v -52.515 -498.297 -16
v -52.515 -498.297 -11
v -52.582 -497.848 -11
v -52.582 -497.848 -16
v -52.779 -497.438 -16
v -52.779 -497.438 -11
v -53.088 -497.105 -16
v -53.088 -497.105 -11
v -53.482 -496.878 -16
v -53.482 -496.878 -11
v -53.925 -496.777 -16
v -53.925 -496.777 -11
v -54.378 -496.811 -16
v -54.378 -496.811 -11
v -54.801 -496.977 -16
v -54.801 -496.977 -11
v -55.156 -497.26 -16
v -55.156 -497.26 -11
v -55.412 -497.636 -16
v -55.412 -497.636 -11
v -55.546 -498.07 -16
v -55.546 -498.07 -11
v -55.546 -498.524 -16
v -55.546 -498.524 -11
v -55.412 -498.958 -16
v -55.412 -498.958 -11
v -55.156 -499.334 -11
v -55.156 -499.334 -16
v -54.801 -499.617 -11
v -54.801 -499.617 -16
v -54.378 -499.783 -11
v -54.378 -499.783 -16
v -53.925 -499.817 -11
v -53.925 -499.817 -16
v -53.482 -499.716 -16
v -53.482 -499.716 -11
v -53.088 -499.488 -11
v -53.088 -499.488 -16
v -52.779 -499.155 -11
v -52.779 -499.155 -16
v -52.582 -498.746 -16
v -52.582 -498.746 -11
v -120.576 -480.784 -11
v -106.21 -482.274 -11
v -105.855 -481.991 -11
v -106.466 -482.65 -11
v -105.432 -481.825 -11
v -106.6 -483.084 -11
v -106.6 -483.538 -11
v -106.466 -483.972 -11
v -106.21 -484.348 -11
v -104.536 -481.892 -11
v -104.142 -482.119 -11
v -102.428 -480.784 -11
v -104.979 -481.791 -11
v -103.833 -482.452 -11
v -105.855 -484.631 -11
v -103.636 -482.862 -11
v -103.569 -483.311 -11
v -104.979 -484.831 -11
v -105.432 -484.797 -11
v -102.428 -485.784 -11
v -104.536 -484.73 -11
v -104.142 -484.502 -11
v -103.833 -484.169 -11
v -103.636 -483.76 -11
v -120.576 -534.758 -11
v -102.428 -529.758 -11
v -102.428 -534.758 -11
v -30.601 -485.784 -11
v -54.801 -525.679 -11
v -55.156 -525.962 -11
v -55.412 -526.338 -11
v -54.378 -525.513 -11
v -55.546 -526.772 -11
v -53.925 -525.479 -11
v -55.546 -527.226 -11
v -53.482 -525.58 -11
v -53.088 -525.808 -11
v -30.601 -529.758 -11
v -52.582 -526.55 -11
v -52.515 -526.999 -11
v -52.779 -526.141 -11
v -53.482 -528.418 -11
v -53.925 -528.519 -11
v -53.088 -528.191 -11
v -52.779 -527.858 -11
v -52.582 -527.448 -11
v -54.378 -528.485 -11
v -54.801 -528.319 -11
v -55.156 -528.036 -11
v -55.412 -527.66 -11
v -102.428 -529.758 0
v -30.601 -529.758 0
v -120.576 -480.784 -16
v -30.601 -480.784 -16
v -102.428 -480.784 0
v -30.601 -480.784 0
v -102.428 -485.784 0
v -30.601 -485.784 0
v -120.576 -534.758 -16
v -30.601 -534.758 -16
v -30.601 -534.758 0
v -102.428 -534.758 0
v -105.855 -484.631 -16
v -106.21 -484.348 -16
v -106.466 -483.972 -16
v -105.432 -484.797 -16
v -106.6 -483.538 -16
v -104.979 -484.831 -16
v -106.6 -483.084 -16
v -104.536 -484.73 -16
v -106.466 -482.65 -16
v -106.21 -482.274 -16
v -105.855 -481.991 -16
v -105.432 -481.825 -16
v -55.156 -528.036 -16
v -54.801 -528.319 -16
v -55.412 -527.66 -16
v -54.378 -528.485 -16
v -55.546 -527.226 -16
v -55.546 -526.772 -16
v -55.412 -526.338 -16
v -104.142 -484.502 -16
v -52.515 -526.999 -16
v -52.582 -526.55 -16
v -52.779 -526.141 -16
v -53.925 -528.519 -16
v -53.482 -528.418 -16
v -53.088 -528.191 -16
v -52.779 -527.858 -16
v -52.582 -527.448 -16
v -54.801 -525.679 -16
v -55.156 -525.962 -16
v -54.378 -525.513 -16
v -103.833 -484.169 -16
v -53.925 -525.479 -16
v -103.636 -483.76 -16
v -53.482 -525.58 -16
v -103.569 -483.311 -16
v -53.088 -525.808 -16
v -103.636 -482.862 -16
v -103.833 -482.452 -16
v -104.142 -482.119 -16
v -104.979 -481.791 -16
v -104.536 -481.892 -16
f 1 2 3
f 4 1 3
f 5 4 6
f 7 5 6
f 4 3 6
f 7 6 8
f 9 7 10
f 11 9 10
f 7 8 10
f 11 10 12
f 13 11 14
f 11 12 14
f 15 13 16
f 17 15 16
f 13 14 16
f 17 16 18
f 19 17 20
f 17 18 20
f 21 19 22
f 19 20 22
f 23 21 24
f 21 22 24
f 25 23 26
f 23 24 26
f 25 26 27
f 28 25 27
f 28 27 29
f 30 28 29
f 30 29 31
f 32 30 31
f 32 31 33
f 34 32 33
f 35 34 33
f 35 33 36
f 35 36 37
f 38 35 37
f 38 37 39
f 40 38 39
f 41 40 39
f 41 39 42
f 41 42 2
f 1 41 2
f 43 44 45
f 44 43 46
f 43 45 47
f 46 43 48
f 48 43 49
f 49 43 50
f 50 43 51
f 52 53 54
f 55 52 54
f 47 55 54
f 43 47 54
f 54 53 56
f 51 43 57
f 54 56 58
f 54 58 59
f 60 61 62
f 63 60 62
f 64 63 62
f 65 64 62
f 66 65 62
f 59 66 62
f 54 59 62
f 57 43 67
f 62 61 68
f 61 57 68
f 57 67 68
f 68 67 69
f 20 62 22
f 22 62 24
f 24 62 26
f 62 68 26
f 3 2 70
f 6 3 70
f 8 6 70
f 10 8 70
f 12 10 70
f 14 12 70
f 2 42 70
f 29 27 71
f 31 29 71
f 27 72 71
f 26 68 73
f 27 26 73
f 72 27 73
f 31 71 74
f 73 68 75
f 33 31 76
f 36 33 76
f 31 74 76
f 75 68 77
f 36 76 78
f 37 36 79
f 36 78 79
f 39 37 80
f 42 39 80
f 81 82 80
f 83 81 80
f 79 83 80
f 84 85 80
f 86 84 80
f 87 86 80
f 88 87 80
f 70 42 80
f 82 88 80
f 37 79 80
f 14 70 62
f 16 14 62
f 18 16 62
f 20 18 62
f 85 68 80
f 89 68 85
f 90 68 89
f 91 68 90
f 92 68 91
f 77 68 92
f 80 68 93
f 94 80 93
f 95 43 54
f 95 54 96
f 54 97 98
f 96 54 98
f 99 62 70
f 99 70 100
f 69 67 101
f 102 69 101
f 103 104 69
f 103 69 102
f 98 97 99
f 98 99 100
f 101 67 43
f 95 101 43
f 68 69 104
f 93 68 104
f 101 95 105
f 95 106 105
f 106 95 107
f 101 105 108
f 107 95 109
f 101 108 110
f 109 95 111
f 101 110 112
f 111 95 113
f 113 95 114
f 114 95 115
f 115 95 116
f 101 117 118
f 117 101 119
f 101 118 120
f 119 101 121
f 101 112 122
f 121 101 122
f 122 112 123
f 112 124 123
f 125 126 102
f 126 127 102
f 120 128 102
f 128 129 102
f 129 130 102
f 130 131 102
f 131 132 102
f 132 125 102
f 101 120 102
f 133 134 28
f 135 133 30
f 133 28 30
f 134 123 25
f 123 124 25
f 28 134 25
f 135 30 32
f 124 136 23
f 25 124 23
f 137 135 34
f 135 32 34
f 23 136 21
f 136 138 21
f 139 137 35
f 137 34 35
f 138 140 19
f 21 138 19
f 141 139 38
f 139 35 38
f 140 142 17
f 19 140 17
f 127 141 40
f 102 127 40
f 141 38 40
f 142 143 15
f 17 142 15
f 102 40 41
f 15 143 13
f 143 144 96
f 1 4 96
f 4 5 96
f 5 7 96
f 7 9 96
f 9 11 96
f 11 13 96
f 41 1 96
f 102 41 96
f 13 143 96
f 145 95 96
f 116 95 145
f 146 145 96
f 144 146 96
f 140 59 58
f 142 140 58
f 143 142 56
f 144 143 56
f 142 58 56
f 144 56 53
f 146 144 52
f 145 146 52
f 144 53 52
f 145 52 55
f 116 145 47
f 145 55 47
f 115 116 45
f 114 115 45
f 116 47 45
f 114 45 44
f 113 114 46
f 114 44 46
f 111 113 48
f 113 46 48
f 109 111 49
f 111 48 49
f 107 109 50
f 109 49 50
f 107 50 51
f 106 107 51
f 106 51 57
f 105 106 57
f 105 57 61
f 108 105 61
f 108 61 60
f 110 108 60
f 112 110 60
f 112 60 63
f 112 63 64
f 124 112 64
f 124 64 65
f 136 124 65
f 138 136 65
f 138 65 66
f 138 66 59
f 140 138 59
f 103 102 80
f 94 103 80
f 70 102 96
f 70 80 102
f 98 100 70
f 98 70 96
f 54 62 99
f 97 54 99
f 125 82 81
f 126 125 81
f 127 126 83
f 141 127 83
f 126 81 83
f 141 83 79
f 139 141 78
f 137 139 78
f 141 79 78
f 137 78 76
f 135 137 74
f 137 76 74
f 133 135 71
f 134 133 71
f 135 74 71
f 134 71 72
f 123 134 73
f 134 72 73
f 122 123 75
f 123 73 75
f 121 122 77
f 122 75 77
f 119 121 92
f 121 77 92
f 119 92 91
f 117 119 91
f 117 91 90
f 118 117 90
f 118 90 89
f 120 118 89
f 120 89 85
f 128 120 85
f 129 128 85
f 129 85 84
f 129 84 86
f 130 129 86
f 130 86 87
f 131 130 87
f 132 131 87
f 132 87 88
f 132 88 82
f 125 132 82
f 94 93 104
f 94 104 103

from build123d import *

# Parameters (mm, degrees)
SKETCH_1_W          = 89.974599949
SKETCH_1_H          = 53.974599949
EXTRUDE_1_DEPTH     = 16
SHELL_1_T           = -5
SKETCH_2_W          = 11
SKETCH_2_H          = 43.974599949
CUT_EXTRUDE_1_DEPTH = 90.974599949
SKETCH_3_W          = 18.148336296
SKETCH_3_H          = 11
CUT_EXTRUDE_2_DEPTH = 54.974599949
SKETCH_4_R          = 1.524003048
CUT_EXTRUDE_3_DEPTH = 17


with BuildPart() as part:
    # 草图1 → 凸台-拉伸1 (new body)
    with BuildSketch(Plane.XY):
        with Locations((-75.588712629, -507.770940429)):
            Rectangle(SKETCH_1_W, SKETCH_1_H)
    extrude(amount=-EXTRUDE_1_DEPTH)

    # 抽壳1
    shell_1_openings = [part.faces().sort_by_distance(p)[0] for p in [
        (-75.588712629, -507.770940429, 0),
    ]]
    offset(amount=SHELL_1_T, openings=shell_1_openings, kind=Kind.INTERSECTION)

    # 草图2 → 切除-拉伸1 (cut, through all)
    with BuildSketch(Plane.ZY.offset(120.576012603)):
        with Locations((-5.5, -507.770940429)):
            Rectangle(SKETCH_2_W, SKETCH_2_H)
    extrude(amount=-CUT_EXTRUDE_1_DEPTH, mode=Mode.SUBTRACT)

    # 草图3 → 切除-拉伸2 (cut, through all)
    with BuildSketch(Plane.XZ.offset(534.758240403)):
        with Locations((-111.501844455, -5.5)):
            Rectangle(SKETCH_3_W, SKETCH_3_H)
    extrude(amount=-CUT_EXTRUDE_2_DEPTH, mode=Mode.SUBTRACT)

    # 草图4 → 切除-拉伸3 (cut, through all)
    with BuildSketch(Plane.XY):
        with Locations((-105.092649637, -483.310945509)):
            Circle(SKETCH_4_R)
        with Locations((-54.038547528, -526.999032885)):
            Circle(SKETCH_4_R)
        with Locations((-54.038547528, -498.296975481)):
            Circle(SKETCH_4_R)
    extrude(amount=-CUT_EXTRUDE_3_DEPTH, mode=Mode.SUBTRACT)


solid = part.part
